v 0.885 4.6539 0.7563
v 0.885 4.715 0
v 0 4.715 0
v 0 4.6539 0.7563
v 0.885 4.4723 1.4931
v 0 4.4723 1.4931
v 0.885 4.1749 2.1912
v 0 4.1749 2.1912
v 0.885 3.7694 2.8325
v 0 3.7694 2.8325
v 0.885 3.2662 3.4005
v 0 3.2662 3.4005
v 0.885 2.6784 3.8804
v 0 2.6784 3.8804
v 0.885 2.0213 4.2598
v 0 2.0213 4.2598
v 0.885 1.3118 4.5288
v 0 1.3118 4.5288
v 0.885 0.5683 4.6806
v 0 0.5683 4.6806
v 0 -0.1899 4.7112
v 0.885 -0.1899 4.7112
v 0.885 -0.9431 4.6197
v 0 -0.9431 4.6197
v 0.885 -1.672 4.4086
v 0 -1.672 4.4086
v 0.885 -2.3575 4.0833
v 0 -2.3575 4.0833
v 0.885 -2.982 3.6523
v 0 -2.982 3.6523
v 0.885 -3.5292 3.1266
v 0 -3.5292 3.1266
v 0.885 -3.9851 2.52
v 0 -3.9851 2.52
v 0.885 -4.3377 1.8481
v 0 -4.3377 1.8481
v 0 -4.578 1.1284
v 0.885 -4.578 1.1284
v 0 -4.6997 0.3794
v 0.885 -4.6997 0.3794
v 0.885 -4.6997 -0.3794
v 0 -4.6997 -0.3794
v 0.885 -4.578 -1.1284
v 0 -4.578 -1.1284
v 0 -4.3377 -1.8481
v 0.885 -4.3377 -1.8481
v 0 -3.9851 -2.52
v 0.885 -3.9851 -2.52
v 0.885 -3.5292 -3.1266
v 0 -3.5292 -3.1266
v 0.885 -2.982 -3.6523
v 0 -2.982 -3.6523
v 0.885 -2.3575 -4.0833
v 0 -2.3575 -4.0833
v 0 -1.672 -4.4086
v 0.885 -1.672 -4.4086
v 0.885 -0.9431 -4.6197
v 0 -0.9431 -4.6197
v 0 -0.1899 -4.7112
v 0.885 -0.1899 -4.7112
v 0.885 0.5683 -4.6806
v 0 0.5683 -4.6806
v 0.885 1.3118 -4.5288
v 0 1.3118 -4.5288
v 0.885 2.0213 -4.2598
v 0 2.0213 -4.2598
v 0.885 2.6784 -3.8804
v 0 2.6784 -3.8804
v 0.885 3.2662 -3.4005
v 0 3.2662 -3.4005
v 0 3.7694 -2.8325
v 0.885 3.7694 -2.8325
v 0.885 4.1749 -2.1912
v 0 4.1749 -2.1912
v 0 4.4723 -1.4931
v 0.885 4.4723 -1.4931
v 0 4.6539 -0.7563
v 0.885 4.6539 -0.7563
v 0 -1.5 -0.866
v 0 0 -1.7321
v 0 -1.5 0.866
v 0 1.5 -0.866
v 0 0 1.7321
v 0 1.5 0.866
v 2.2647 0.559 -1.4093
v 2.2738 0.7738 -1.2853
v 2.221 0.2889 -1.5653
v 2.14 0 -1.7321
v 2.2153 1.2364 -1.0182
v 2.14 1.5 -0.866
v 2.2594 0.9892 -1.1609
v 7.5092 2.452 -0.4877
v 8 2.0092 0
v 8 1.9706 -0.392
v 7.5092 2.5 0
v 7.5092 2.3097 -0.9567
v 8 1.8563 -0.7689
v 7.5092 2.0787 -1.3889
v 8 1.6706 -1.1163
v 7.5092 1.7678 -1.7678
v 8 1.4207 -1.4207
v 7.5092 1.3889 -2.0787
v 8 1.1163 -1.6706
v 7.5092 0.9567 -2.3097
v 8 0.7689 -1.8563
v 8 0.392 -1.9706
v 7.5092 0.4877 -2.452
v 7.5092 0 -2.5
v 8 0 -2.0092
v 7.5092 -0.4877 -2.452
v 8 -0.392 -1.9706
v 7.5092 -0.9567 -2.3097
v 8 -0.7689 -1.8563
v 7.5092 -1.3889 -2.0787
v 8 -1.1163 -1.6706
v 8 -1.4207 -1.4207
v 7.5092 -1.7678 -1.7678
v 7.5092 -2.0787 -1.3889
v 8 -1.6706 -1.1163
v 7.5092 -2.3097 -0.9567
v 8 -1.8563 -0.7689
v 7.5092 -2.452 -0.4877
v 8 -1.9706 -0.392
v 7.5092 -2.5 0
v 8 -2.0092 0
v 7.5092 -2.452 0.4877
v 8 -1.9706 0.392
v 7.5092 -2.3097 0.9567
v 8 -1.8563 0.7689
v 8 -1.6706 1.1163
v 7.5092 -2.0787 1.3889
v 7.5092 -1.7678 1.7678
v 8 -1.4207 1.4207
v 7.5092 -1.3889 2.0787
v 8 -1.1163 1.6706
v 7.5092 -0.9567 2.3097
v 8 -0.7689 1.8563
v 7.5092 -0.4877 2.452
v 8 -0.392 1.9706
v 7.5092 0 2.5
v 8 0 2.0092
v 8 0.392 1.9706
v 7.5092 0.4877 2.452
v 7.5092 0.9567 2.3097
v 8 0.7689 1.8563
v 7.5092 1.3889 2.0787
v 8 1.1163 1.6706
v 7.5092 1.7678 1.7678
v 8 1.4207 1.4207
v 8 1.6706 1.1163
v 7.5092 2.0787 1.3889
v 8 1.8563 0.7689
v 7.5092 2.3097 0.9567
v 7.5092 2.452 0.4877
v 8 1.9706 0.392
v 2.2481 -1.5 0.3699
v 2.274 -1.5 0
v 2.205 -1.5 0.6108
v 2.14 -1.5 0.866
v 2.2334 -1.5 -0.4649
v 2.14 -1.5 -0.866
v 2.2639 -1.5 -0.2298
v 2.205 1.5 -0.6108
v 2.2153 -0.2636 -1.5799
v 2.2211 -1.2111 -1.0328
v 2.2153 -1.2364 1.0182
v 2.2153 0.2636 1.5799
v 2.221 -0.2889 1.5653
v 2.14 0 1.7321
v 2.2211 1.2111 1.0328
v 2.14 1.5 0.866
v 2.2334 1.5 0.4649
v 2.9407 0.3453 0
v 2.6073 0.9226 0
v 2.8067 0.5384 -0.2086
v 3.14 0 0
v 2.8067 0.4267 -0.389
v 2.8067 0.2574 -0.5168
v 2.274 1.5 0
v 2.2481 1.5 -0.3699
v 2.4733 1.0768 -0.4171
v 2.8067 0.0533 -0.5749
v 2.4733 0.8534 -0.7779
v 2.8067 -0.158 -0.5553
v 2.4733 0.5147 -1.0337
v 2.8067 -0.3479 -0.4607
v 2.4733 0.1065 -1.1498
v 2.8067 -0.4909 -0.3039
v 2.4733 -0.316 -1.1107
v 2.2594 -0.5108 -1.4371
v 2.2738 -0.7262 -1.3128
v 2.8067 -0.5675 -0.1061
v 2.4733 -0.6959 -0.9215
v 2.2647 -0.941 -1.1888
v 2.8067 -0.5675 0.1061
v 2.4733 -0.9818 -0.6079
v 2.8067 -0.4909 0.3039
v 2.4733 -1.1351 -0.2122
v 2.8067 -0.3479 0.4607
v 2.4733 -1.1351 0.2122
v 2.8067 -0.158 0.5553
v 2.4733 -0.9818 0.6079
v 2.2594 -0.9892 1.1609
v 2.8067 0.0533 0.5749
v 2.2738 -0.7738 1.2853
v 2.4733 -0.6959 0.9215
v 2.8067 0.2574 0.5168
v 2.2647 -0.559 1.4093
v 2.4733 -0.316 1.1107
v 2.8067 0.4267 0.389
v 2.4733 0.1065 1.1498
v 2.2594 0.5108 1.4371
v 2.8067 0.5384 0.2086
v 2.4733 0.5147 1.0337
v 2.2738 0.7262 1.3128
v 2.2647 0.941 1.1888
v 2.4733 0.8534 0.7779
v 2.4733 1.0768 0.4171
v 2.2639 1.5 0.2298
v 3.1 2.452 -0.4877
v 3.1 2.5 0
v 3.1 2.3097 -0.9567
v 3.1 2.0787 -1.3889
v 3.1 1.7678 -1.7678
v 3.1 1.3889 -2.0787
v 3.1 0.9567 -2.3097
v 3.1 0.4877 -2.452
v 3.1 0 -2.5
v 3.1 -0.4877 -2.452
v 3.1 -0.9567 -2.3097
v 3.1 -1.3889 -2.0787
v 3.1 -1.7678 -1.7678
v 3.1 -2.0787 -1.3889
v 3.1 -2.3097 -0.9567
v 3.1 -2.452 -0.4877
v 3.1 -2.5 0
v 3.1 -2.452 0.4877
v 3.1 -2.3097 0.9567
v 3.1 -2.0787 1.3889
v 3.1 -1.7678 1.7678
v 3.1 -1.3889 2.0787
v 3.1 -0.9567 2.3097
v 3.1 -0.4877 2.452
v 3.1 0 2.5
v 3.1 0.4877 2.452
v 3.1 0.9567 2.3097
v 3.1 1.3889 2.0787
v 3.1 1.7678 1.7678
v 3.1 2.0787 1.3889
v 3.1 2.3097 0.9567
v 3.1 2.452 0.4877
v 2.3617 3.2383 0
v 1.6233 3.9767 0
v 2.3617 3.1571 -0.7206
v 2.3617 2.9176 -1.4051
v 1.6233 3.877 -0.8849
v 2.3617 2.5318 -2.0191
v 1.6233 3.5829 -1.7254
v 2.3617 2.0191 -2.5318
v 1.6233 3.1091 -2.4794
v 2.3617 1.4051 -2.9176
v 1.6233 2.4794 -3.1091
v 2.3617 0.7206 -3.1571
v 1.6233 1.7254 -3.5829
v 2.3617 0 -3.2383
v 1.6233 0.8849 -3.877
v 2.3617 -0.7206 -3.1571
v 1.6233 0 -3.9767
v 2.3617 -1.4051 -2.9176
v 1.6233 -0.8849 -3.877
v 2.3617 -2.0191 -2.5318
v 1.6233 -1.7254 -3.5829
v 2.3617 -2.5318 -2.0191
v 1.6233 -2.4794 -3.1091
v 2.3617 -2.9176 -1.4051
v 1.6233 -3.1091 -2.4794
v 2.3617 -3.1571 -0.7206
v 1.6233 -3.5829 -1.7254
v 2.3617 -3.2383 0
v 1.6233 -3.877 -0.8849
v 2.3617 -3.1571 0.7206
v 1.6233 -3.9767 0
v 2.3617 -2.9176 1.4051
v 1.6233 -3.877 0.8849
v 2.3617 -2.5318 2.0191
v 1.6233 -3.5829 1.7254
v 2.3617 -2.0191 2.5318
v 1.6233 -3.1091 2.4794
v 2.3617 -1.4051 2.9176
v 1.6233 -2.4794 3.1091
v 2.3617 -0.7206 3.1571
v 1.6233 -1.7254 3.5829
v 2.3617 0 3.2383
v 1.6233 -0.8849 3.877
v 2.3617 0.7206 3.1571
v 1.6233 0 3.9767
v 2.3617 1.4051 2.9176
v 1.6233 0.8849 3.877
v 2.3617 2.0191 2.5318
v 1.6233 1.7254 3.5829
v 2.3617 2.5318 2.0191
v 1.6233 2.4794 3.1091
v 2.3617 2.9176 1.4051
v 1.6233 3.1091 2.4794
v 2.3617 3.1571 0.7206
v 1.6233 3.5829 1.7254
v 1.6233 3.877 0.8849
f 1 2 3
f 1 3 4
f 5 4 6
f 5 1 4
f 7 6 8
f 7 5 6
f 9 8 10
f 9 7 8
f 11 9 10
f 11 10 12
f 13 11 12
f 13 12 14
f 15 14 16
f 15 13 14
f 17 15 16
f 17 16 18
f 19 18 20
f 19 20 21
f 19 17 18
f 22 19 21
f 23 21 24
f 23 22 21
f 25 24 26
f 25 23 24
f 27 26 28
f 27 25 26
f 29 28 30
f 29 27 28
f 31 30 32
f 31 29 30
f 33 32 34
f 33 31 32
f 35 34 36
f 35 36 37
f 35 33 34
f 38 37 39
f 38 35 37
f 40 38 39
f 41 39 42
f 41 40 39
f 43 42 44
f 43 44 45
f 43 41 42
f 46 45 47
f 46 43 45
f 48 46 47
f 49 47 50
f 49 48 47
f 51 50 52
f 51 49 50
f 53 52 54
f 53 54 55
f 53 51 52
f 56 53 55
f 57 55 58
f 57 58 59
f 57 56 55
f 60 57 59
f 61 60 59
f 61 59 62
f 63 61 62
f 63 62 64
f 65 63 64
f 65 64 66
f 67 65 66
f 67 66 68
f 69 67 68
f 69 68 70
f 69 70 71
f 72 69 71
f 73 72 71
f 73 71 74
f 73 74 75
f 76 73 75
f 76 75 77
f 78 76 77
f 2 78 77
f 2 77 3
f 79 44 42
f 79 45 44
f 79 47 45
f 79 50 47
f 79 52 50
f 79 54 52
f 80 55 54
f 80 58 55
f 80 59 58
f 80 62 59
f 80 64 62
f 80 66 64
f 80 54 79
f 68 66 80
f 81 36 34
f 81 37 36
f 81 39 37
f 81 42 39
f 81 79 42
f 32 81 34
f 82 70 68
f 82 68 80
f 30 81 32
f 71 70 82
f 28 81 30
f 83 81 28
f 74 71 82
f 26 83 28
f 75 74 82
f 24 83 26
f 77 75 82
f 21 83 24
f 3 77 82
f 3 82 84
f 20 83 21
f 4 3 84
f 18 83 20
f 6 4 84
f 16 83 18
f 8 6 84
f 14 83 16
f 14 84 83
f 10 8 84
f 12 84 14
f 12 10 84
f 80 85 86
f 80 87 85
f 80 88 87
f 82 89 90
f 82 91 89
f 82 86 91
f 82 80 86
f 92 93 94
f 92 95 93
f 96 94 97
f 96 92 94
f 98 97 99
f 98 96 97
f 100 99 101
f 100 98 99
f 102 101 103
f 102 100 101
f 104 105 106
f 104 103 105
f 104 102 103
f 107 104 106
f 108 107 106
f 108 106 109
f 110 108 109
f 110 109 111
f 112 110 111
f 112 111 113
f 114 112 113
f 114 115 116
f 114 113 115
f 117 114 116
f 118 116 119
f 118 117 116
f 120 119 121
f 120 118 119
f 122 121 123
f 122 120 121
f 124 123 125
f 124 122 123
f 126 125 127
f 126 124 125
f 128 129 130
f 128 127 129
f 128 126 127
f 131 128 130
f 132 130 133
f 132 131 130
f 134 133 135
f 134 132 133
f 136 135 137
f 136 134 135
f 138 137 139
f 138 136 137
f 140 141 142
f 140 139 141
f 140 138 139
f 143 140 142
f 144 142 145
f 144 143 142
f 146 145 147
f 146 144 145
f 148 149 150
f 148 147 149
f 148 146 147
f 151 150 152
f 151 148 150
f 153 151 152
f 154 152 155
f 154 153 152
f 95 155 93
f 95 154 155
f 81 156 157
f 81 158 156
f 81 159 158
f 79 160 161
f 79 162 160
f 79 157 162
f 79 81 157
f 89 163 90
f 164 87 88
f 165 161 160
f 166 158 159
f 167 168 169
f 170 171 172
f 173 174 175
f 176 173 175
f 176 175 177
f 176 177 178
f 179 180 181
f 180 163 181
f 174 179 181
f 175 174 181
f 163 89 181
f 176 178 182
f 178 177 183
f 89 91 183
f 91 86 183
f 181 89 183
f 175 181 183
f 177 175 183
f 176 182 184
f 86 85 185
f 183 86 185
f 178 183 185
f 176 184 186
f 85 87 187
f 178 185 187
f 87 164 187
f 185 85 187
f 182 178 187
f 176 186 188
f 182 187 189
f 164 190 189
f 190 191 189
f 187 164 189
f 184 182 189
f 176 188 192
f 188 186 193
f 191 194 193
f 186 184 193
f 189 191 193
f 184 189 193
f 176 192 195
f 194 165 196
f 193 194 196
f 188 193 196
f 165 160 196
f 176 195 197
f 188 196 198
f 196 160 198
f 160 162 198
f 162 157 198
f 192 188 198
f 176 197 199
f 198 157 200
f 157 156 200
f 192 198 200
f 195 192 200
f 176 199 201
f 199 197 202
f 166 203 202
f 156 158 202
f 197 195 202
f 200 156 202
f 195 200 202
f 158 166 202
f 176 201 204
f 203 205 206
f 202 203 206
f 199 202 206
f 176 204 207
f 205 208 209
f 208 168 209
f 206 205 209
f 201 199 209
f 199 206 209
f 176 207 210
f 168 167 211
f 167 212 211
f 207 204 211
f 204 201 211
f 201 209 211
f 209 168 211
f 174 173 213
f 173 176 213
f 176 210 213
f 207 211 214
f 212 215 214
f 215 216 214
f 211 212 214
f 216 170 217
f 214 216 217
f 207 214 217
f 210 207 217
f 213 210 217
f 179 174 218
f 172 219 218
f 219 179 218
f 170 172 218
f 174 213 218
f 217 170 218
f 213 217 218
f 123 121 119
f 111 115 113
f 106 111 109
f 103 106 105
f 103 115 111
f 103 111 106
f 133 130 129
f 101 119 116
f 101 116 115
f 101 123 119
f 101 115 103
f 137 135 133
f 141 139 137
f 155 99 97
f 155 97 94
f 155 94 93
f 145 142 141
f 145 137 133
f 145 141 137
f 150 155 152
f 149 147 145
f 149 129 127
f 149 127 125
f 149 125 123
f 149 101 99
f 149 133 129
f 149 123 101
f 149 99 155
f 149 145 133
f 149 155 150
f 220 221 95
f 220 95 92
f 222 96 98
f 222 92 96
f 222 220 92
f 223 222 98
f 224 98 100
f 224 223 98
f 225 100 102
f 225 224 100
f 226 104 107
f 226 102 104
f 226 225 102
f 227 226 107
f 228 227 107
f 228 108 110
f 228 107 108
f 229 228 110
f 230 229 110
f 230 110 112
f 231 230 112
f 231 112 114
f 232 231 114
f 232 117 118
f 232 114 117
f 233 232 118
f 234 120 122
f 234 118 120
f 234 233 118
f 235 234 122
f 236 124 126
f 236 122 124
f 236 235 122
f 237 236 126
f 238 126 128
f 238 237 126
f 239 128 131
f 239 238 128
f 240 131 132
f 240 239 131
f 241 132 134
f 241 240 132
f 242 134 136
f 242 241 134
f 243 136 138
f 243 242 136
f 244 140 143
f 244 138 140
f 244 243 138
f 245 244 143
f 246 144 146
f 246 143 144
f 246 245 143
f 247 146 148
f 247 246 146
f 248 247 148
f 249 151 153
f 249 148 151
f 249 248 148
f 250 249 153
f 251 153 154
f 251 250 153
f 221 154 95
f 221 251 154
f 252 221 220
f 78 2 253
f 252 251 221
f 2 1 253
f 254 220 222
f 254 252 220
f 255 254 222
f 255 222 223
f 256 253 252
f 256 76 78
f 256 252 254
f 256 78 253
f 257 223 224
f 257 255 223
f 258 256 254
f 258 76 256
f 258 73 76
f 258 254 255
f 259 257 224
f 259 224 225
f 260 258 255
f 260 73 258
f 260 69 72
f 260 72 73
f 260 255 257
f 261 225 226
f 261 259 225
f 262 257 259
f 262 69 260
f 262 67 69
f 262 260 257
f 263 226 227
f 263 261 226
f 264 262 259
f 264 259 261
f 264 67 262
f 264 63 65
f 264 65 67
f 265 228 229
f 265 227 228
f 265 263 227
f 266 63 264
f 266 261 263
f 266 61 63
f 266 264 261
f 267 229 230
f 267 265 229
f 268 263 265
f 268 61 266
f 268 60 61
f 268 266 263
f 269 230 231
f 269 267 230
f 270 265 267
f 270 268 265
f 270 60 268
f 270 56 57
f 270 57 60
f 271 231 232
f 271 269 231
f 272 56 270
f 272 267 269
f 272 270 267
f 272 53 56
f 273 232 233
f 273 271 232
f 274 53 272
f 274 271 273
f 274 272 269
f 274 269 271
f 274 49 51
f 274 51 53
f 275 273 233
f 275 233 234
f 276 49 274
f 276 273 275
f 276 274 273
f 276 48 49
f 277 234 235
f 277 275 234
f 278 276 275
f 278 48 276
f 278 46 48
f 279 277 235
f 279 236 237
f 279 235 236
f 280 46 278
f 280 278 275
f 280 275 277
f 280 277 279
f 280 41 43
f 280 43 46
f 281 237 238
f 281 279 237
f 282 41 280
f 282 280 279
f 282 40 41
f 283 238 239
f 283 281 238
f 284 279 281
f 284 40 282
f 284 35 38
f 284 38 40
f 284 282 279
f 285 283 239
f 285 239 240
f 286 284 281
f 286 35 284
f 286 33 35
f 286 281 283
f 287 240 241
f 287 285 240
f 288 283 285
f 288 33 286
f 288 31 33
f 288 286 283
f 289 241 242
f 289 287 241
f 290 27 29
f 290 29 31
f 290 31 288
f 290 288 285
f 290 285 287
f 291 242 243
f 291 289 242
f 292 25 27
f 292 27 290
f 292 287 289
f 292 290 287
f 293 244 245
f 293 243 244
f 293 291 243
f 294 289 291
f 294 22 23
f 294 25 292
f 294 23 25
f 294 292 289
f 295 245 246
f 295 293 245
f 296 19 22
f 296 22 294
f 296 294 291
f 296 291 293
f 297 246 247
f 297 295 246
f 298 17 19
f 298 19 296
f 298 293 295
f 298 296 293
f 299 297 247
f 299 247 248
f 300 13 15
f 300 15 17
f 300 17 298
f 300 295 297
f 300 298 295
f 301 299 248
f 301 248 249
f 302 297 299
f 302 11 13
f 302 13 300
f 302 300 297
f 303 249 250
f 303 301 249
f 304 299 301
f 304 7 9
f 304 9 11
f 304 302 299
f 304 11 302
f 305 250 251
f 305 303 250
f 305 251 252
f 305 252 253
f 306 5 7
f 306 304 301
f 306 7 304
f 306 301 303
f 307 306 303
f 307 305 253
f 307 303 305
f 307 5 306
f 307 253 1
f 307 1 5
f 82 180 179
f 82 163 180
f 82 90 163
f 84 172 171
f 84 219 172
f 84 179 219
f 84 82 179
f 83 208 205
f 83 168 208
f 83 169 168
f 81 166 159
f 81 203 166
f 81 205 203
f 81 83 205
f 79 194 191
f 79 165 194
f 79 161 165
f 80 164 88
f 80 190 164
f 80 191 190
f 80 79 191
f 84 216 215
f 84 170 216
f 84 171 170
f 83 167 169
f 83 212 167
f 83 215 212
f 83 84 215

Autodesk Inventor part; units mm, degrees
ref_plane "YZ Plane" through (0, 0, 0) normal (1, 0, 0) x (0, 1, 0)
ref_plane "XZ Plane" through (0, 0, 0) normal (0, 1, 0) x (-1, 0, 0)
sketch "Esquisse1" plane through (0, 0, 0) normal (0, 0, 1) x (1, 0, 0)
  line L0 (8, 0) -> (8, 2.5)
  line L1 (8, 2.5) -> (5.6, 2.5)
  line L2 (5.6, 2.5) -> (5.1092, 2.5)
  line L3 (0, 4.715) -> (0, 1.7321)
  line L4 (0, 1.7321) -> (2.14, 1.7321)
  line L5 (2.14, 1.7321) -> (3.14, 0)
  line L6 (3.14, 0) -> (8, 0)
  line L7 (0, 4.715) -> (0.885, 4.715)
  line L8 (0.885, 4.715) -> (3.1, 2.5)
  line L9 (5.1092, 2.5) -> (3.1, 2.5)
  line L10 (5.6, 2.5) -> (3.1, 2.5) construction
  line L11 (3.1, 2.5) -> (3.1, 2.5)
  line L12 (-1.6, 0) -> (9.6, 0) projected
  line L13 (0, -0.943) -> (0, 5.658) projected
  dimension "d0" = 8
  dimension "d1" = 2.4
  dimension "d2" = 2.14
  dimension "d3" = 5
  dimension "d6" = 3.1
  dimension "d7" = 45
  dimension "d8" = 3.4641
  dimension "d9" = 60
  dimension "d10" = 9.43
  dimension "d11" = 5
  dimension "d12" = 0.4908
revolve "Corps" add sketch "Esquisse1" angle 360 about axis through (3.14, 0, 0) along (1, 0, 0) contours L6 L5 L4 L3 L7 L8 L9 L2 L1 L0
sketch "Esquisse2" plane through (0, 0, 0) normal (-1, 0, 0) x (0, 0, 1)
  circle A0 centre (0, 0) radius 1.7321 projected
  line L0 (0, -6.601) -> (0, 6.601) projected
  line L1 (-6.601, 0) -> (6.601, 0) projected
  line L2 (1.7321, 0) -> (0.866, -1.5)
  line L3 (0.866, -1.5) -> (-0.866, -1.5)
  line L4 (-0.866, -1.5) -> (-1.7321, 0)
  line L5 (-1.7321, 0) -> (-0.866, 1.5)
  line L6 (-0.866, 1.5) -> (0.866, 1.5)
  line L7 (0.866, 1.5) -> (1.7321, 0)
  point P0 (0, 1.7321)
extrude "Rainure" add sketch "Esquisse2" against normal up to next contours L7 A0 | A0 L2 | L6 L0 A0 | A0 L0 L3 | L0 L6 A0 | A0 L3 L0 | L4 A0 | A0 L5
thread "Filetage" size "M5x0.8" class "6g" standard "ISO Metric profile" length 2.4
chamfer "Chanfrein1" distance 0.4908 distance2 0.4908 1 edges at (8, -2.5, 0) measured on face at (8, 0.4809, 1.5312)
ref_plane "Work Plane1" through (104.775, 0, 0) normal (0, 0, -1) x (1, 0, 0)
equation "\"d15\" = GEL"
equation "\"d17\" = -0.5 * SPD + 0.5 * GD"
equation "\"d18\" = GUL"
equation "\"d0\" = NLG"
equation "\"d1\" = GEL"
equation "\"d2\" = INTI"
equation "\"d3\" = GD"
equation "\"d6\" = KOH"
equation "\"d7\" = 0.5 * SEWI"
equation "\"d8\" = 1.1547 * SW"
equation "\"d10\" = KOD"
equation "\"d11\" = BDM"
equation "\"d12\" = GAL"
equation "\"NLG\" = 8"
equation "\"INTI\" = 2.14"
equation "\"GEL\" = 2.4"
equation "\"GAL\" = 0.61345 * PTC"
equation "\"KOH\" = 3.1"
equation "\"KOD\" = 9.43"
equation "\"GUL\" = 0.61345 * PTC"
equation "\"SPD\" = NND - 1.2269 * PTC"
equation "\"BDM\" = NND"
equation "\"GD\" = NND"
equation "\"SEWI\" = 90deg"
equation "\"SW\" = 3"
equation "\"TOA\" = 30deg"
equation "\"GD1\" = THREADDIA - 1.2269 * PTC"
equation "\"EPV\" = 5.6"
equation "\"THREADDIA\" = 5"
equation "\"PTC\" = 0.8"
equation "\"NND\" = 5"
equation "\"E0\" = 3.47"
equation "\"THREADDESC\" = 1.2345"
properties part number "ISO 10642 - M5 x  8" material "Acier"
